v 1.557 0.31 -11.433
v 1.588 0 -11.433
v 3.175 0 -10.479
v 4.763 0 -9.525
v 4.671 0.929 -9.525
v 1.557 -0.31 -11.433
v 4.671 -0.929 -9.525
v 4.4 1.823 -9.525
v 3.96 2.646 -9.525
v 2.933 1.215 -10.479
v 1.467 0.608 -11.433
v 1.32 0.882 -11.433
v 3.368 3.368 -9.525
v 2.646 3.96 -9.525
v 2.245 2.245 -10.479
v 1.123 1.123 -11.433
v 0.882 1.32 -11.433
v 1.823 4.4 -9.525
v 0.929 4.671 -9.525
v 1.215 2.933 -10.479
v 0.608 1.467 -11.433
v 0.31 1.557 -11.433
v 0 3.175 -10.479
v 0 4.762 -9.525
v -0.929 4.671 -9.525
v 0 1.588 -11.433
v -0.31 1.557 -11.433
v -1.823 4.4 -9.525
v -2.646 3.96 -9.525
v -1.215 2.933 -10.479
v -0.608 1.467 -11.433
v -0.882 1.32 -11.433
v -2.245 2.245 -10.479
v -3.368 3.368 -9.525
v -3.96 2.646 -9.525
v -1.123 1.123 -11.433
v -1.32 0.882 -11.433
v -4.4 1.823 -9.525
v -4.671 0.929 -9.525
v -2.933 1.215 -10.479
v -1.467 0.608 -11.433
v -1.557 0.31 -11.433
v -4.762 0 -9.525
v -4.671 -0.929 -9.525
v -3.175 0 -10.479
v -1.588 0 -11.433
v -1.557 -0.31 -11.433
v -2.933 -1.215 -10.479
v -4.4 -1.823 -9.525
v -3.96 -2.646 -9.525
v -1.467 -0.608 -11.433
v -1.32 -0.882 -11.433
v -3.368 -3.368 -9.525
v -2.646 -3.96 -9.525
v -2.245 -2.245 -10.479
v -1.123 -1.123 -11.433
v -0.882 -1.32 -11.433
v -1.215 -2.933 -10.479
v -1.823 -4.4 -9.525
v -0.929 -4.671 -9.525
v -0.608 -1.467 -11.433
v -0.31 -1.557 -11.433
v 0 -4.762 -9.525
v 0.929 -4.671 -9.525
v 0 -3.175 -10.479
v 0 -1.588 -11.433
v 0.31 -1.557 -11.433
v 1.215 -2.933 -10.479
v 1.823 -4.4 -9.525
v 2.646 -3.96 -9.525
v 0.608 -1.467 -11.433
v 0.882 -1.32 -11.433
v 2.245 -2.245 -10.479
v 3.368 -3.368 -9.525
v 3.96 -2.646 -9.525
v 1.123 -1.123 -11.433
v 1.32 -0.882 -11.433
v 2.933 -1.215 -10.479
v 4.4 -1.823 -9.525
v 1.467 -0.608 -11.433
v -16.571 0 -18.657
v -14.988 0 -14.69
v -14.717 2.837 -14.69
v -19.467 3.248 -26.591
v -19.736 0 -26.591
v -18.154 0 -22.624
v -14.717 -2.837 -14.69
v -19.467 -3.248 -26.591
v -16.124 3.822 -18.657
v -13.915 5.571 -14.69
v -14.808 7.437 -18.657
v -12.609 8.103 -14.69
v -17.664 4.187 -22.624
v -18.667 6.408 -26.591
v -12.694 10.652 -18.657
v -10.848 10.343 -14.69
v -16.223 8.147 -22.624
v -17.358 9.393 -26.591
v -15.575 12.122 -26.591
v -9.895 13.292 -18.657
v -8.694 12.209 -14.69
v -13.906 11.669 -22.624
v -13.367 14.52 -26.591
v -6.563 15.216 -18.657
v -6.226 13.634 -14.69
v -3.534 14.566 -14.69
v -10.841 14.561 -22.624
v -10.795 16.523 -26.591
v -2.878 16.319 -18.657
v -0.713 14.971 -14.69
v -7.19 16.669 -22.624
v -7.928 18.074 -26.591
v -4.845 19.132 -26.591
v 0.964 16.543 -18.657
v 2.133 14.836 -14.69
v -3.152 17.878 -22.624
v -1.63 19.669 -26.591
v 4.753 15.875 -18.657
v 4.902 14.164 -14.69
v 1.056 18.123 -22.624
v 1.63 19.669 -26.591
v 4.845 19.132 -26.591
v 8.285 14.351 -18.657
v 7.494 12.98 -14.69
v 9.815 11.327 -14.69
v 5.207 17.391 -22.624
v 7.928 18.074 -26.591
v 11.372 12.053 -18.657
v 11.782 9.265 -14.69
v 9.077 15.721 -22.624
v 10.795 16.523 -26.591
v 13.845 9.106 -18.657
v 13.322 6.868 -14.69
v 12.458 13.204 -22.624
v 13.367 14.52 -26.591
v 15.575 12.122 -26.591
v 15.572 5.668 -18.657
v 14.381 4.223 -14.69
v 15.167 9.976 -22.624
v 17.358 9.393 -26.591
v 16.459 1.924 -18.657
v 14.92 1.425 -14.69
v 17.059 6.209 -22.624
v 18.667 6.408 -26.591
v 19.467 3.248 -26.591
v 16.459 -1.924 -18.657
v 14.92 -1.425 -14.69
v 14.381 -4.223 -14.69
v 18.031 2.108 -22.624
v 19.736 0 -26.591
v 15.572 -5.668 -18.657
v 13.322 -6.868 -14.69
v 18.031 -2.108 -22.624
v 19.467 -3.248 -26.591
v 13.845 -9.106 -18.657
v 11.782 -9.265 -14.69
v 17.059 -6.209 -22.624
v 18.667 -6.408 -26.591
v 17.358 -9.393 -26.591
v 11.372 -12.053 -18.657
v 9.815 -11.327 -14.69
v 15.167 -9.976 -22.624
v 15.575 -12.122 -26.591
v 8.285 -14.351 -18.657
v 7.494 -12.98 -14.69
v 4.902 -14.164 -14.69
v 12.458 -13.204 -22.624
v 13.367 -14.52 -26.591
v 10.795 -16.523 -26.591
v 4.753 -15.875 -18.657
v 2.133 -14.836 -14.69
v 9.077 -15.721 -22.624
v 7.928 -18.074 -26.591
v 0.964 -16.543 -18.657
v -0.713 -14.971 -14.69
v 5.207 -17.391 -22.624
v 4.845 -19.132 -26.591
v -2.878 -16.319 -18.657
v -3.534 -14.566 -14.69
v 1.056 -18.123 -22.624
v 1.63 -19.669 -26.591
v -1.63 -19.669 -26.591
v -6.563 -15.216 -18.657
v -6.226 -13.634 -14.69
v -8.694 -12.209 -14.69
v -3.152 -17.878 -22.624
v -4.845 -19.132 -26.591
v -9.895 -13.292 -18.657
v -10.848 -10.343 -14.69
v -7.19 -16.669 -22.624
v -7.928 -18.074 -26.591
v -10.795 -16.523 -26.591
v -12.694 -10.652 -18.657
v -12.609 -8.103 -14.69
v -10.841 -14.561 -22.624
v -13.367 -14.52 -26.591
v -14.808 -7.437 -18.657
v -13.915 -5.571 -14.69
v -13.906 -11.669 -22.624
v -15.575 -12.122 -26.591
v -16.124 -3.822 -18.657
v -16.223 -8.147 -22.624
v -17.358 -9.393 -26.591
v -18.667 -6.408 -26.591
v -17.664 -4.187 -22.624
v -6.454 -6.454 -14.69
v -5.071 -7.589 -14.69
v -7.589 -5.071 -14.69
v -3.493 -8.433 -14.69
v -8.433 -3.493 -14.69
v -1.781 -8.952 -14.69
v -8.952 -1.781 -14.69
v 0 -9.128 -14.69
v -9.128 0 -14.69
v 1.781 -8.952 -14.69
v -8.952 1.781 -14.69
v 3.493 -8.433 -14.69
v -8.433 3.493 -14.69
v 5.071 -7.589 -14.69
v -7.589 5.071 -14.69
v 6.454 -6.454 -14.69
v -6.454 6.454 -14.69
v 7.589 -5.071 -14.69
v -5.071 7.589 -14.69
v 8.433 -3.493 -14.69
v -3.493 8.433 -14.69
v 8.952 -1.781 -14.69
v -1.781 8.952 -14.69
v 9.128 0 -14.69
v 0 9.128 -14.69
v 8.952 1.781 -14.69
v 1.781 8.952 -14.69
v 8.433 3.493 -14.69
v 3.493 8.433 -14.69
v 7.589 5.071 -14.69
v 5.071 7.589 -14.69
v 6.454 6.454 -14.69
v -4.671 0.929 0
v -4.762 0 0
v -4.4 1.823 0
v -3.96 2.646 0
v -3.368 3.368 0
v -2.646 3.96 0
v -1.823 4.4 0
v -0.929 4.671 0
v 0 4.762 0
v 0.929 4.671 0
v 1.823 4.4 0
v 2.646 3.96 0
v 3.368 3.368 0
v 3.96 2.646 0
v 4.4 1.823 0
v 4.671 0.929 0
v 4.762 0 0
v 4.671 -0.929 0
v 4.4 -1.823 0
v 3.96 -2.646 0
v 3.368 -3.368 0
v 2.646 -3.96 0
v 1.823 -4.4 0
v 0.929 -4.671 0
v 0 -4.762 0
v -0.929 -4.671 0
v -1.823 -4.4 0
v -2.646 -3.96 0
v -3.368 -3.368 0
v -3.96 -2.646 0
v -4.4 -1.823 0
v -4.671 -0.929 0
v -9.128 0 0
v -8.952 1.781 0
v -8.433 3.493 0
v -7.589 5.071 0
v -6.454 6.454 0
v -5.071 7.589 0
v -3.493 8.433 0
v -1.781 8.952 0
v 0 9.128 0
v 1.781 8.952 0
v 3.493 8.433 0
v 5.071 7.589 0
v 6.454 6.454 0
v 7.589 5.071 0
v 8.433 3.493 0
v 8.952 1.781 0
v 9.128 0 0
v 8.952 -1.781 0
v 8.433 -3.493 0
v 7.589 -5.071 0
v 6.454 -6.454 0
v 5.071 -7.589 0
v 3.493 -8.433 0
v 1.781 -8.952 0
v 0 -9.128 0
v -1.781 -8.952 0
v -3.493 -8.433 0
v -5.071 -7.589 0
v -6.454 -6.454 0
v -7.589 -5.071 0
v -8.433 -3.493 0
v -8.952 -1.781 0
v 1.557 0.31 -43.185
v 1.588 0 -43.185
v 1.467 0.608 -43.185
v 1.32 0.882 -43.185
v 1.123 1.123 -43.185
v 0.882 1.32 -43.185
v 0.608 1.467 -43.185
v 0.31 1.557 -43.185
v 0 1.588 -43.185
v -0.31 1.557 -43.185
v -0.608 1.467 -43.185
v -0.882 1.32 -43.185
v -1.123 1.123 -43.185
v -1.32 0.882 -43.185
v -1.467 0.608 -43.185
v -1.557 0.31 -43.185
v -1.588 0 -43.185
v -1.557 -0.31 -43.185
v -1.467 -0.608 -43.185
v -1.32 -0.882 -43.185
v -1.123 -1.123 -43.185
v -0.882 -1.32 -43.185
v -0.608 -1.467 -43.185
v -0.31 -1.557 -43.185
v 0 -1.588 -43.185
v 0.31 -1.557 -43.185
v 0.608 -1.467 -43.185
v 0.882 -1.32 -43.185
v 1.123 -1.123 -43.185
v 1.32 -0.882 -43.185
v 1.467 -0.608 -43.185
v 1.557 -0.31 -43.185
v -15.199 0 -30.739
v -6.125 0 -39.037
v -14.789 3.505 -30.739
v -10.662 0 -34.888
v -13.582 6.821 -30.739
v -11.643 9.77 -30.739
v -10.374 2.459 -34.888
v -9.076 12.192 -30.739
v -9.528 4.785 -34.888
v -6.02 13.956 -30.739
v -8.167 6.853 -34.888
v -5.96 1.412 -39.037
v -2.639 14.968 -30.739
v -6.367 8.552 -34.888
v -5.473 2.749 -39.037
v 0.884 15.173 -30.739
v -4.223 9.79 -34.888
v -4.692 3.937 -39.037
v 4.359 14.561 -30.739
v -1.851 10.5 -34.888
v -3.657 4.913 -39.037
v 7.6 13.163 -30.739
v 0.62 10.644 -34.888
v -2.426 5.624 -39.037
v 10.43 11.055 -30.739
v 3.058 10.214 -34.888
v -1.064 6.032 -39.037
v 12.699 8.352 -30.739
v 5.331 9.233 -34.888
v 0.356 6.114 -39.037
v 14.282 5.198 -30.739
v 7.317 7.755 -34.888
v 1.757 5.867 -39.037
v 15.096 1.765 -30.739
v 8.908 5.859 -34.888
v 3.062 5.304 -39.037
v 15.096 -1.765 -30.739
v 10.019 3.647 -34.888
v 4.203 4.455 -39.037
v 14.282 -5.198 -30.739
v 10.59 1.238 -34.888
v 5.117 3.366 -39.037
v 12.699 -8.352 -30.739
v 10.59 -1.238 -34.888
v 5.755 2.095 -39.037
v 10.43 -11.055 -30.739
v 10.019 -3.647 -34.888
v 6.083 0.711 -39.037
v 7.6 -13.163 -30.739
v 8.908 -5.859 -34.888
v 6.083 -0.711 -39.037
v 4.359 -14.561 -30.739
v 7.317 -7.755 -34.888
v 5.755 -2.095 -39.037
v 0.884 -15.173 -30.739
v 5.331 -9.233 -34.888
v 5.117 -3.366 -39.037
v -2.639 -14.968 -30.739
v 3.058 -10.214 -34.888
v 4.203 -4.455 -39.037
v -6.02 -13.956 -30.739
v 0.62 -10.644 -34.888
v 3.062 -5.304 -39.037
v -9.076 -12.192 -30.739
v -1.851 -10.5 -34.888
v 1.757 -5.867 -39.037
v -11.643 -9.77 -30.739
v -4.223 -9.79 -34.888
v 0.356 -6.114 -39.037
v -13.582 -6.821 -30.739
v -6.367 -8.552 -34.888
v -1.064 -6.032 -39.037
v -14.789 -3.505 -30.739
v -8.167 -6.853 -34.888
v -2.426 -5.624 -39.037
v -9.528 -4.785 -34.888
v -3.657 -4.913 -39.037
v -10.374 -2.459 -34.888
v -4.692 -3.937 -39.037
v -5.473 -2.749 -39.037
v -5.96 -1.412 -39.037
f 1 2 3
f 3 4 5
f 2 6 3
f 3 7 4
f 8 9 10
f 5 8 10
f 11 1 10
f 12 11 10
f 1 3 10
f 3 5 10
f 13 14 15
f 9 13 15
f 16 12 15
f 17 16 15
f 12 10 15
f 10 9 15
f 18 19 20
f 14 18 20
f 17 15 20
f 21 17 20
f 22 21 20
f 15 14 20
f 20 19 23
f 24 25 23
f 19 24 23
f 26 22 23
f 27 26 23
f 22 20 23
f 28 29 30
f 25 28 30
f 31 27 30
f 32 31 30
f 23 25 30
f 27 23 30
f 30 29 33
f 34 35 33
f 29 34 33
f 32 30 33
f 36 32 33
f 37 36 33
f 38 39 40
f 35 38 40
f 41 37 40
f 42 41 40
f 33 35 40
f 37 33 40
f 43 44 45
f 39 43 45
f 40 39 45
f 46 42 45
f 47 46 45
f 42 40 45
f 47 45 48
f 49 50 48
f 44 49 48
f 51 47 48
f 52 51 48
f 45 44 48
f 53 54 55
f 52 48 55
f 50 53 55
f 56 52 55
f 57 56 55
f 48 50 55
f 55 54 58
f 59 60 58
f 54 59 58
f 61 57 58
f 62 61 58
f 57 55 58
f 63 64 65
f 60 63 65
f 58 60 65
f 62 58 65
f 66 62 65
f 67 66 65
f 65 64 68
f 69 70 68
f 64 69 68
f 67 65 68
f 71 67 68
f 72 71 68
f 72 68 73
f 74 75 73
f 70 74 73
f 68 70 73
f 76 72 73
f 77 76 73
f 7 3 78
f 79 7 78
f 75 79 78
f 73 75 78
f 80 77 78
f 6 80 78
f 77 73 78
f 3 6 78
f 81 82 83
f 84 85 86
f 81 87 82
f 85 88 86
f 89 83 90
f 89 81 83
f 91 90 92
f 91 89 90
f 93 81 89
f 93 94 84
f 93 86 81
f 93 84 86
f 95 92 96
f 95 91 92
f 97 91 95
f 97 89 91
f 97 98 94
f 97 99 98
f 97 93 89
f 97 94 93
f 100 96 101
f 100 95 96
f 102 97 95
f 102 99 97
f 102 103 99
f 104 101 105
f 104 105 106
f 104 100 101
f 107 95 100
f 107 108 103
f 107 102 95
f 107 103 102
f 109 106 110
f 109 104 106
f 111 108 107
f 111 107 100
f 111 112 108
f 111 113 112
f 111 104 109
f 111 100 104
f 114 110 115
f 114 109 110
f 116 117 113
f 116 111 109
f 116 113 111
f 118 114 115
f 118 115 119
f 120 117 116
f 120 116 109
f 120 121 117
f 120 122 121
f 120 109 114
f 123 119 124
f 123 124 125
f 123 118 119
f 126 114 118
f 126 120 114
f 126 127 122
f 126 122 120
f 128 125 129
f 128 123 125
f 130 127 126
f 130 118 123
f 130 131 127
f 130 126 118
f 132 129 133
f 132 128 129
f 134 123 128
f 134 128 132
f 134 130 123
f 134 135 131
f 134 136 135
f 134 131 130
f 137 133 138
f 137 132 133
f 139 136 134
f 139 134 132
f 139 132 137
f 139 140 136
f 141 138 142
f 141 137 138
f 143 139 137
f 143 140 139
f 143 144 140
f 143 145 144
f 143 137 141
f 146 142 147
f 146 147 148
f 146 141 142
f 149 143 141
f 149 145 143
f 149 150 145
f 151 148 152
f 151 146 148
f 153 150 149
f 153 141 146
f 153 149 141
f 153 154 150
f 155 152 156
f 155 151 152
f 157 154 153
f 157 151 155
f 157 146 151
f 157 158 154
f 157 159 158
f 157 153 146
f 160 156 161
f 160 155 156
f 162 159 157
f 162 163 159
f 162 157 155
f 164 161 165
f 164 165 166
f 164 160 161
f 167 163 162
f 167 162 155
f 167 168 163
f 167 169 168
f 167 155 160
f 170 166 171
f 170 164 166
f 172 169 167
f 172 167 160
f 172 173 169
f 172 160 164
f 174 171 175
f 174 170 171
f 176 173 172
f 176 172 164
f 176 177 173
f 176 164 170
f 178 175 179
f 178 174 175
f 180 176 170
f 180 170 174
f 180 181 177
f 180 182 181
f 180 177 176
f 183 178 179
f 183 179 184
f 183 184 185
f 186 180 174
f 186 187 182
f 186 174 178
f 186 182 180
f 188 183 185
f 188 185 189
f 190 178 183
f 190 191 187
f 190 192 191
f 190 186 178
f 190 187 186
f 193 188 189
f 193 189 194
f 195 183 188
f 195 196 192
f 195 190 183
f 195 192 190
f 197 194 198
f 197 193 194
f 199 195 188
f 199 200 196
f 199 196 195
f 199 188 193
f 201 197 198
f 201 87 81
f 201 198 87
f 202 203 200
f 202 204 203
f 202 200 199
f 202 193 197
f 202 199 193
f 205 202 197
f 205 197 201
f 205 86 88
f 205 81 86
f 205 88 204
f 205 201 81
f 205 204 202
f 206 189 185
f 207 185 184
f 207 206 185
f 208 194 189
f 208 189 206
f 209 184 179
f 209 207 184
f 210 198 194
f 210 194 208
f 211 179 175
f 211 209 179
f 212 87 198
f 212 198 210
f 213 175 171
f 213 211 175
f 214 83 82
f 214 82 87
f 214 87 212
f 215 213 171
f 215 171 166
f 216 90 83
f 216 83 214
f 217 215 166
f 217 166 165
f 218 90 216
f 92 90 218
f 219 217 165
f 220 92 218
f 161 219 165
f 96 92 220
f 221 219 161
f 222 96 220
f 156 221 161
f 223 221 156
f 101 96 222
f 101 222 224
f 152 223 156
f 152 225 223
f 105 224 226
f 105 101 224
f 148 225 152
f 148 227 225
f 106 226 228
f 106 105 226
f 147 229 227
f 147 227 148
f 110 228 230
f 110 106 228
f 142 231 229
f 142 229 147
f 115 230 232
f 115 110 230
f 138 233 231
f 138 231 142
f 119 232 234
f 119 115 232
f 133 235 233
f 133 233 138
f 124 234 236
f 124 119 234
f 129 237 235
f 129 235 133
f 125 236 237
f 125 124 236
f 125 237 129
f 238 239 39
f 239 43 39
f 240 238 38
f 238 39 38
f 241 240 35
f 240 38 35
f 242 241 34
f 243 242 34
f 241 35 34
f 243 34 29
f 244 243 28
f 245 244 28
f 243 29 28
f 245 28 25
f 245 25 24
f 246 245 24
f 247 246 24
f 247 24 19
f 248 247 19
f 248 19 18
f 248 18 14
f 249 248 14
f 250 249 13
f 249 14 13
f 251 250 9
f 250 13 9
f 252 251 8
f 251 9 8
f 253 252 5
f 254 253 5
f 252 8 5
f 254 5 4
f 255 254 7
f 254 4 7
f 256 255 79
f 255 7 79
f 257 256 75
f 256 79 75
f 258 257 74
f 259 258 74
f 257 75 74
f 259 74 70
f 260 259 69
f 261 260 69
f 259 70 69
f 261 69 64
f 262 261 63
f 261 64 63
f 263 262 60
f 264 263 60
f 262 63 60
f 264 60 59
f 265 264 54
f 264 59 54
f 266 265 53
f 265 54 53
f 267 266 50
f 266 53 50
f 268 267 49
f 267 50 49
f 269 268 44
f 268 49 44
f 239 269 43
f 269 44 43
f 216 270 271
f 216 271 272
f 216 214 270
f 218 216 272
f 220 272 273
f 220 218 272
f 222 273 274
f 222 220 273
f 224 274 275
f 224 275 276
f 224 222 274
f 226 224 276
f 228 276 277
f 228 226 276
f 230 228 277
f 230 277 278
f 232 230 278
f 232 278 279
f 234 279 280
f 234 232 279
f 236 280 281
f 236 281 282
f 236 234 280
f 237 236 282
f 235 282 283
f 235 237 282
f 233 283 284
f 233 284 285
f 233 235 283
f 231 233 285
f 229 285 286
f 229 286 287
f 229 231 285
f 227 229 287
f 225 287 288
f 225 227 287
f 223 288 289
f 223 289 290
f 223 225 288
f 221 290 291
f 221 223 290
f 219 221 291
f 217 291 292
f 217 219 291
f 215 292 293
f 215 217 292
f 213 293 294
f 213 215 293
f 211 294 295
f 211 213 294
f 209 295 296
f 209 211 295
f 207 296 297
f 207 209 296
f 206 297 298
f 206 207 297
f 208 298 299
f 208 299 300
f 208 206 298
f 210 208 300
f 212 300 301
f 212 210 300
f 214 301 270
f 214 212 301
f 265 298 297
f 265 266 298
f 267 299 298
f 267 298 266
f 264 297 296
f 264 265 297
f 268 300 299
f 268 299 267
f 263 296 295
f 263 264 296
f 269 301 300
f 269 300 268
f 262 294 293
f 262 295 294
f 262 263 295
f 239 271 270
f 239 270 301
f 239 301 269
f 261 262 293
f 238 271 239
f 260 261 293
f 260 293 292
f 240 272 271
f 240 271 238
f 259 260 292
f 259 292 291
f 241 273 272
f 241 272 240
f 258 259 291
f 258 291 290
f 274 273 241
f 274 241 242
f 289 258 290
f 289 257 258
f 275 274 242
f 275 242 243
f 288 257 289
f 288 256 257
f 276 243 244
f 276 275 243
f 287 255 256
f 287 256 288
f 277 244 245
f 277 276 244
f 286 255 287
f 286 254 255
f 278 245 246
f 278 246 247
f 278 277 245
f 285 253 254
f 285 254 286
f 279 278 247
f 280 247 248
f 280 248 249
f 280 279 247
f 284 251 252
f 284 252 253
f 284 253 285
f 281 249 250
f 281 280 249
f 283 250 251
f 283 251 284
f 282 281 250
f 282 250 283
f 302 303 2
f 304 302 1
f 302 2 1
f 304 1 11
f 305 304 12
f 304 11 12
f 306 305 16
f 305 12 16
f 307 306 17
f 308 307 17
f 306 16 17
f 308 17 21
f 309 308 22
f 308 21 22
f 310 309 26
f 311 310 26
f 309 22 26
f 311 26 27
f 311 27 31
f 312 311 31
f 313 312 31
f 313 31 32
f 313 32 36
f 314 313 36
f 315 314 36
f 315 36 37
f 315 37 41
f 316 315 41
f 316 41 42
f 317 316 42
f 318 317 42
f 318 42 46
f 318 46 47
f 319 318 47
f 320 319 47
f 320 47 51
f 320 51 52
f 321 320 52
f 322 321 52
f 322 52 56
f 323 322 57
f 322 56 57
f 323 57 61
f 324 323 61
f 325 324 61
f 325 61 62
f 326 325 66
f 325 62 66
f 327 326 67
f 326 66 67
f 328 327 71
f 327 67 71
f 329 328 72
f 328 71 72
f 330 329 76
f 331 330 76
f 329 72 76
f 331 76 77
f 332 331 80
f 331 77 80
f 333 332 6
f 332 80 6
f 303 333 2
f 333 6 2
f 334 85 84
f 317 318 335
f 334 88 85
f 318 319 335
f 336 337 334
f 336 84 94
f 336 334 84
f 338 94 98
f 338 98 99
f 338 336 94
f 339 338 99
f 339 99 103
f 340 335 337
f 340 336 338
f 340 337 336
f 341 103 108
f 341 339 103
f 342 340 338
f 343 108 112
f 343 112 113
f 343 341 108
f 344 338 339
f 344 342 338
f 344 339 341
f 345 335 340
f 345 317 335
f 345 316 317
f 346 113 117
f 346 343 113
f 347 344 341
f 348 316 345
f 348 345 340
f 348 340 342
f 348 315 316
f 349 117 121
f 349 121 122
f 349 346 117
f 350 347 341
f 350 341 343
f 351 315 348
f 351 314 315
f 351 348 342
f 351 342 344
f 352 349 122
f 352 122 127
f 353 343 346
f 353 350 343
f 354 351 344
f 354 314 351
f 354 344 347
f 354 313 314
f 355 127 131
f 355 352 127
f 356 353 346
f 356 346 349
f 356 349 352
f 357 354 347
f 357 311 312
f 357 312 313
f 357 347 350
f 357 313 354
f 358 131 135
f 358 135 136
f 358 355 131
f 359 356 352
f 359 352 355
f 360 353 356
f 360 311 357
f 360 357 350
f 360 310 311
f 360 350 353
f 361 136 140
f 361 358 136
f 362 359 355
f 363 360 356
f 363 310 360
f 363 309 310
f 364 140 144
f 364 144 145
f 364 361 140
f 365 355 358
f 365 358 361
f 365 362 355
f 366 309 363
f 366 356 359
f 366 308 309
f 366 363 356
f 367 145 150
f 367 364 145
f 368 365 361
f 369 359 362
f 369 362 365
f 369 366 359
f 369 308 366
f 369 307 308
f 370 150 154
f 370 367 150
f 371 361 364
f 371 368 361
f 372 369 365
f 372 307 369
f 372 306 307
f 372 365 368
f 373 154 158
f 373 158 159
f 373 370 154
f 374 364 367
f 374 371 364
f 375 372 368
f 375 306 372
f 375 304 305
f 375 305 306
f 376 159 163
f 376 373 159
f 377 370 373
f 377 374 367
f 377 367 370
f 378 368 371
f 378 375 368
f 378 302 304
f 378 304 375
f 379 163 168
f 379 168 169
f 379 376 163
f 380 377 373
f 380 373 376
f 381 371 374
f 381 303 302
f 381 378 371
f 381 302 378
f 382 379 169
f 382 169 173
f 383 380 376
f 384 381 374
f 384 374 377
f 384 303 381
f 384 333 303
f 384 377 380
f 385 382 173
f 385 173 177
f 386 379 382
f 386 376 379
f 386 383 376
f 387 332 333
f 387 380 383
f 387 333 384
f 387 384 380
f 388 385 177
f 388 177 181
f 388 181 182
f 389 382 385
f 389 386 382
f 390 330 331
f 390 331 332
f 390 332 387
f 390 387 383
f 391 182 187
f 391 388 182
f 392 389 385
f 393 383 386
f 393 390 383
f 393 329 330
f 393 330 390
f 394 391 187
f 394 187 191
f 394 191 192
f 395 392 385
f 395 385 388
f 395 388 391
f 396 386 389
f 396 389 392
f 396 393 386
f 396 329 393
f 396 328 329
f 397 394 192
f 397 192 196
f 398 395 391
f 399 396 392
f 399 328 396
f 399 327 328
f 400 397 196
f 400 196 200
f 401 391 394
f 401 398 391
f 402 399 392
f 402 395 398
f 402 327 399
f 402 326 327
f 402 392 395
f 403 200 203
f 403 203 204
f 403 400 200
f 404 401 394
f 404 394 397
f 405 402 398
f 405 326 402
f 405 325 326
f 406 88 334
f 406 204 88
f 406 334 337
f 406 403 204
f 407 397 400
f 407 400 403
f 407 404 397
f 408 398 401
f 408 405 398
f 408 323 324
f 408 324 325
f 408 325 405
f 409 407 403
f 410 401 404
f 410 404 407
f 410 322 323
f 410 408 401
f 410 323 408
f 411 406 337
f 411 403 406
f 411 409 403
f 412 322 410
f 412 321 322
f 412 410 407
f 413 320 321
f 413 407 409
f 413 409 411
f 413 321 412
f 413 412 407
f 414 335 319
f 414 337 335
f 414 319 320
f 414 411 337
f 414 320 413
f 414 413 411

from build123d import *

# Parameters (mm, degrees)
F3_D     = 9.525
F3_DEPTH = 9.525
F3_TIP   = 2.8615986981
F4_R     = 1.5875
F5_DEPTH = 48.27


with BuildPart() as f1:
    # F0 (on Front) → F1 (revolve)
    with BuildSketch(Plane.XZ):
        Polygon((0, -44.6369265472), (0, 0), (-9.1277007014, 0), (-9.1277007014, -14.6898925304), (-14.9883243068, -14.6898925304), (-19.7362518723, -26.5907669723), align=None)
    revolve(axis=Axis((0, 0, -22.3184632736), (0, 0, -1)))

    # F3
    with Locations(Plane.XY):
        with Locations((0, 0)):
            Hole(F3_D / 2, depth=F3_DEPTH)
            with Locations((0, 0, -(F3_DEPTH + F3_TIP / 2))):  # 118° drill point
                Cone(0, F3_D / 2, F3_TIP, mode=Mode.SUBTRACT)

    # F4 (on Top) → F5 (cut)
    with BuildSketch(Plane.XY):
        Circle(F4_R)
    extrude(amount=-F5_DEPTH, mode=Mode.SUBTRACT)


solid = f1.part
